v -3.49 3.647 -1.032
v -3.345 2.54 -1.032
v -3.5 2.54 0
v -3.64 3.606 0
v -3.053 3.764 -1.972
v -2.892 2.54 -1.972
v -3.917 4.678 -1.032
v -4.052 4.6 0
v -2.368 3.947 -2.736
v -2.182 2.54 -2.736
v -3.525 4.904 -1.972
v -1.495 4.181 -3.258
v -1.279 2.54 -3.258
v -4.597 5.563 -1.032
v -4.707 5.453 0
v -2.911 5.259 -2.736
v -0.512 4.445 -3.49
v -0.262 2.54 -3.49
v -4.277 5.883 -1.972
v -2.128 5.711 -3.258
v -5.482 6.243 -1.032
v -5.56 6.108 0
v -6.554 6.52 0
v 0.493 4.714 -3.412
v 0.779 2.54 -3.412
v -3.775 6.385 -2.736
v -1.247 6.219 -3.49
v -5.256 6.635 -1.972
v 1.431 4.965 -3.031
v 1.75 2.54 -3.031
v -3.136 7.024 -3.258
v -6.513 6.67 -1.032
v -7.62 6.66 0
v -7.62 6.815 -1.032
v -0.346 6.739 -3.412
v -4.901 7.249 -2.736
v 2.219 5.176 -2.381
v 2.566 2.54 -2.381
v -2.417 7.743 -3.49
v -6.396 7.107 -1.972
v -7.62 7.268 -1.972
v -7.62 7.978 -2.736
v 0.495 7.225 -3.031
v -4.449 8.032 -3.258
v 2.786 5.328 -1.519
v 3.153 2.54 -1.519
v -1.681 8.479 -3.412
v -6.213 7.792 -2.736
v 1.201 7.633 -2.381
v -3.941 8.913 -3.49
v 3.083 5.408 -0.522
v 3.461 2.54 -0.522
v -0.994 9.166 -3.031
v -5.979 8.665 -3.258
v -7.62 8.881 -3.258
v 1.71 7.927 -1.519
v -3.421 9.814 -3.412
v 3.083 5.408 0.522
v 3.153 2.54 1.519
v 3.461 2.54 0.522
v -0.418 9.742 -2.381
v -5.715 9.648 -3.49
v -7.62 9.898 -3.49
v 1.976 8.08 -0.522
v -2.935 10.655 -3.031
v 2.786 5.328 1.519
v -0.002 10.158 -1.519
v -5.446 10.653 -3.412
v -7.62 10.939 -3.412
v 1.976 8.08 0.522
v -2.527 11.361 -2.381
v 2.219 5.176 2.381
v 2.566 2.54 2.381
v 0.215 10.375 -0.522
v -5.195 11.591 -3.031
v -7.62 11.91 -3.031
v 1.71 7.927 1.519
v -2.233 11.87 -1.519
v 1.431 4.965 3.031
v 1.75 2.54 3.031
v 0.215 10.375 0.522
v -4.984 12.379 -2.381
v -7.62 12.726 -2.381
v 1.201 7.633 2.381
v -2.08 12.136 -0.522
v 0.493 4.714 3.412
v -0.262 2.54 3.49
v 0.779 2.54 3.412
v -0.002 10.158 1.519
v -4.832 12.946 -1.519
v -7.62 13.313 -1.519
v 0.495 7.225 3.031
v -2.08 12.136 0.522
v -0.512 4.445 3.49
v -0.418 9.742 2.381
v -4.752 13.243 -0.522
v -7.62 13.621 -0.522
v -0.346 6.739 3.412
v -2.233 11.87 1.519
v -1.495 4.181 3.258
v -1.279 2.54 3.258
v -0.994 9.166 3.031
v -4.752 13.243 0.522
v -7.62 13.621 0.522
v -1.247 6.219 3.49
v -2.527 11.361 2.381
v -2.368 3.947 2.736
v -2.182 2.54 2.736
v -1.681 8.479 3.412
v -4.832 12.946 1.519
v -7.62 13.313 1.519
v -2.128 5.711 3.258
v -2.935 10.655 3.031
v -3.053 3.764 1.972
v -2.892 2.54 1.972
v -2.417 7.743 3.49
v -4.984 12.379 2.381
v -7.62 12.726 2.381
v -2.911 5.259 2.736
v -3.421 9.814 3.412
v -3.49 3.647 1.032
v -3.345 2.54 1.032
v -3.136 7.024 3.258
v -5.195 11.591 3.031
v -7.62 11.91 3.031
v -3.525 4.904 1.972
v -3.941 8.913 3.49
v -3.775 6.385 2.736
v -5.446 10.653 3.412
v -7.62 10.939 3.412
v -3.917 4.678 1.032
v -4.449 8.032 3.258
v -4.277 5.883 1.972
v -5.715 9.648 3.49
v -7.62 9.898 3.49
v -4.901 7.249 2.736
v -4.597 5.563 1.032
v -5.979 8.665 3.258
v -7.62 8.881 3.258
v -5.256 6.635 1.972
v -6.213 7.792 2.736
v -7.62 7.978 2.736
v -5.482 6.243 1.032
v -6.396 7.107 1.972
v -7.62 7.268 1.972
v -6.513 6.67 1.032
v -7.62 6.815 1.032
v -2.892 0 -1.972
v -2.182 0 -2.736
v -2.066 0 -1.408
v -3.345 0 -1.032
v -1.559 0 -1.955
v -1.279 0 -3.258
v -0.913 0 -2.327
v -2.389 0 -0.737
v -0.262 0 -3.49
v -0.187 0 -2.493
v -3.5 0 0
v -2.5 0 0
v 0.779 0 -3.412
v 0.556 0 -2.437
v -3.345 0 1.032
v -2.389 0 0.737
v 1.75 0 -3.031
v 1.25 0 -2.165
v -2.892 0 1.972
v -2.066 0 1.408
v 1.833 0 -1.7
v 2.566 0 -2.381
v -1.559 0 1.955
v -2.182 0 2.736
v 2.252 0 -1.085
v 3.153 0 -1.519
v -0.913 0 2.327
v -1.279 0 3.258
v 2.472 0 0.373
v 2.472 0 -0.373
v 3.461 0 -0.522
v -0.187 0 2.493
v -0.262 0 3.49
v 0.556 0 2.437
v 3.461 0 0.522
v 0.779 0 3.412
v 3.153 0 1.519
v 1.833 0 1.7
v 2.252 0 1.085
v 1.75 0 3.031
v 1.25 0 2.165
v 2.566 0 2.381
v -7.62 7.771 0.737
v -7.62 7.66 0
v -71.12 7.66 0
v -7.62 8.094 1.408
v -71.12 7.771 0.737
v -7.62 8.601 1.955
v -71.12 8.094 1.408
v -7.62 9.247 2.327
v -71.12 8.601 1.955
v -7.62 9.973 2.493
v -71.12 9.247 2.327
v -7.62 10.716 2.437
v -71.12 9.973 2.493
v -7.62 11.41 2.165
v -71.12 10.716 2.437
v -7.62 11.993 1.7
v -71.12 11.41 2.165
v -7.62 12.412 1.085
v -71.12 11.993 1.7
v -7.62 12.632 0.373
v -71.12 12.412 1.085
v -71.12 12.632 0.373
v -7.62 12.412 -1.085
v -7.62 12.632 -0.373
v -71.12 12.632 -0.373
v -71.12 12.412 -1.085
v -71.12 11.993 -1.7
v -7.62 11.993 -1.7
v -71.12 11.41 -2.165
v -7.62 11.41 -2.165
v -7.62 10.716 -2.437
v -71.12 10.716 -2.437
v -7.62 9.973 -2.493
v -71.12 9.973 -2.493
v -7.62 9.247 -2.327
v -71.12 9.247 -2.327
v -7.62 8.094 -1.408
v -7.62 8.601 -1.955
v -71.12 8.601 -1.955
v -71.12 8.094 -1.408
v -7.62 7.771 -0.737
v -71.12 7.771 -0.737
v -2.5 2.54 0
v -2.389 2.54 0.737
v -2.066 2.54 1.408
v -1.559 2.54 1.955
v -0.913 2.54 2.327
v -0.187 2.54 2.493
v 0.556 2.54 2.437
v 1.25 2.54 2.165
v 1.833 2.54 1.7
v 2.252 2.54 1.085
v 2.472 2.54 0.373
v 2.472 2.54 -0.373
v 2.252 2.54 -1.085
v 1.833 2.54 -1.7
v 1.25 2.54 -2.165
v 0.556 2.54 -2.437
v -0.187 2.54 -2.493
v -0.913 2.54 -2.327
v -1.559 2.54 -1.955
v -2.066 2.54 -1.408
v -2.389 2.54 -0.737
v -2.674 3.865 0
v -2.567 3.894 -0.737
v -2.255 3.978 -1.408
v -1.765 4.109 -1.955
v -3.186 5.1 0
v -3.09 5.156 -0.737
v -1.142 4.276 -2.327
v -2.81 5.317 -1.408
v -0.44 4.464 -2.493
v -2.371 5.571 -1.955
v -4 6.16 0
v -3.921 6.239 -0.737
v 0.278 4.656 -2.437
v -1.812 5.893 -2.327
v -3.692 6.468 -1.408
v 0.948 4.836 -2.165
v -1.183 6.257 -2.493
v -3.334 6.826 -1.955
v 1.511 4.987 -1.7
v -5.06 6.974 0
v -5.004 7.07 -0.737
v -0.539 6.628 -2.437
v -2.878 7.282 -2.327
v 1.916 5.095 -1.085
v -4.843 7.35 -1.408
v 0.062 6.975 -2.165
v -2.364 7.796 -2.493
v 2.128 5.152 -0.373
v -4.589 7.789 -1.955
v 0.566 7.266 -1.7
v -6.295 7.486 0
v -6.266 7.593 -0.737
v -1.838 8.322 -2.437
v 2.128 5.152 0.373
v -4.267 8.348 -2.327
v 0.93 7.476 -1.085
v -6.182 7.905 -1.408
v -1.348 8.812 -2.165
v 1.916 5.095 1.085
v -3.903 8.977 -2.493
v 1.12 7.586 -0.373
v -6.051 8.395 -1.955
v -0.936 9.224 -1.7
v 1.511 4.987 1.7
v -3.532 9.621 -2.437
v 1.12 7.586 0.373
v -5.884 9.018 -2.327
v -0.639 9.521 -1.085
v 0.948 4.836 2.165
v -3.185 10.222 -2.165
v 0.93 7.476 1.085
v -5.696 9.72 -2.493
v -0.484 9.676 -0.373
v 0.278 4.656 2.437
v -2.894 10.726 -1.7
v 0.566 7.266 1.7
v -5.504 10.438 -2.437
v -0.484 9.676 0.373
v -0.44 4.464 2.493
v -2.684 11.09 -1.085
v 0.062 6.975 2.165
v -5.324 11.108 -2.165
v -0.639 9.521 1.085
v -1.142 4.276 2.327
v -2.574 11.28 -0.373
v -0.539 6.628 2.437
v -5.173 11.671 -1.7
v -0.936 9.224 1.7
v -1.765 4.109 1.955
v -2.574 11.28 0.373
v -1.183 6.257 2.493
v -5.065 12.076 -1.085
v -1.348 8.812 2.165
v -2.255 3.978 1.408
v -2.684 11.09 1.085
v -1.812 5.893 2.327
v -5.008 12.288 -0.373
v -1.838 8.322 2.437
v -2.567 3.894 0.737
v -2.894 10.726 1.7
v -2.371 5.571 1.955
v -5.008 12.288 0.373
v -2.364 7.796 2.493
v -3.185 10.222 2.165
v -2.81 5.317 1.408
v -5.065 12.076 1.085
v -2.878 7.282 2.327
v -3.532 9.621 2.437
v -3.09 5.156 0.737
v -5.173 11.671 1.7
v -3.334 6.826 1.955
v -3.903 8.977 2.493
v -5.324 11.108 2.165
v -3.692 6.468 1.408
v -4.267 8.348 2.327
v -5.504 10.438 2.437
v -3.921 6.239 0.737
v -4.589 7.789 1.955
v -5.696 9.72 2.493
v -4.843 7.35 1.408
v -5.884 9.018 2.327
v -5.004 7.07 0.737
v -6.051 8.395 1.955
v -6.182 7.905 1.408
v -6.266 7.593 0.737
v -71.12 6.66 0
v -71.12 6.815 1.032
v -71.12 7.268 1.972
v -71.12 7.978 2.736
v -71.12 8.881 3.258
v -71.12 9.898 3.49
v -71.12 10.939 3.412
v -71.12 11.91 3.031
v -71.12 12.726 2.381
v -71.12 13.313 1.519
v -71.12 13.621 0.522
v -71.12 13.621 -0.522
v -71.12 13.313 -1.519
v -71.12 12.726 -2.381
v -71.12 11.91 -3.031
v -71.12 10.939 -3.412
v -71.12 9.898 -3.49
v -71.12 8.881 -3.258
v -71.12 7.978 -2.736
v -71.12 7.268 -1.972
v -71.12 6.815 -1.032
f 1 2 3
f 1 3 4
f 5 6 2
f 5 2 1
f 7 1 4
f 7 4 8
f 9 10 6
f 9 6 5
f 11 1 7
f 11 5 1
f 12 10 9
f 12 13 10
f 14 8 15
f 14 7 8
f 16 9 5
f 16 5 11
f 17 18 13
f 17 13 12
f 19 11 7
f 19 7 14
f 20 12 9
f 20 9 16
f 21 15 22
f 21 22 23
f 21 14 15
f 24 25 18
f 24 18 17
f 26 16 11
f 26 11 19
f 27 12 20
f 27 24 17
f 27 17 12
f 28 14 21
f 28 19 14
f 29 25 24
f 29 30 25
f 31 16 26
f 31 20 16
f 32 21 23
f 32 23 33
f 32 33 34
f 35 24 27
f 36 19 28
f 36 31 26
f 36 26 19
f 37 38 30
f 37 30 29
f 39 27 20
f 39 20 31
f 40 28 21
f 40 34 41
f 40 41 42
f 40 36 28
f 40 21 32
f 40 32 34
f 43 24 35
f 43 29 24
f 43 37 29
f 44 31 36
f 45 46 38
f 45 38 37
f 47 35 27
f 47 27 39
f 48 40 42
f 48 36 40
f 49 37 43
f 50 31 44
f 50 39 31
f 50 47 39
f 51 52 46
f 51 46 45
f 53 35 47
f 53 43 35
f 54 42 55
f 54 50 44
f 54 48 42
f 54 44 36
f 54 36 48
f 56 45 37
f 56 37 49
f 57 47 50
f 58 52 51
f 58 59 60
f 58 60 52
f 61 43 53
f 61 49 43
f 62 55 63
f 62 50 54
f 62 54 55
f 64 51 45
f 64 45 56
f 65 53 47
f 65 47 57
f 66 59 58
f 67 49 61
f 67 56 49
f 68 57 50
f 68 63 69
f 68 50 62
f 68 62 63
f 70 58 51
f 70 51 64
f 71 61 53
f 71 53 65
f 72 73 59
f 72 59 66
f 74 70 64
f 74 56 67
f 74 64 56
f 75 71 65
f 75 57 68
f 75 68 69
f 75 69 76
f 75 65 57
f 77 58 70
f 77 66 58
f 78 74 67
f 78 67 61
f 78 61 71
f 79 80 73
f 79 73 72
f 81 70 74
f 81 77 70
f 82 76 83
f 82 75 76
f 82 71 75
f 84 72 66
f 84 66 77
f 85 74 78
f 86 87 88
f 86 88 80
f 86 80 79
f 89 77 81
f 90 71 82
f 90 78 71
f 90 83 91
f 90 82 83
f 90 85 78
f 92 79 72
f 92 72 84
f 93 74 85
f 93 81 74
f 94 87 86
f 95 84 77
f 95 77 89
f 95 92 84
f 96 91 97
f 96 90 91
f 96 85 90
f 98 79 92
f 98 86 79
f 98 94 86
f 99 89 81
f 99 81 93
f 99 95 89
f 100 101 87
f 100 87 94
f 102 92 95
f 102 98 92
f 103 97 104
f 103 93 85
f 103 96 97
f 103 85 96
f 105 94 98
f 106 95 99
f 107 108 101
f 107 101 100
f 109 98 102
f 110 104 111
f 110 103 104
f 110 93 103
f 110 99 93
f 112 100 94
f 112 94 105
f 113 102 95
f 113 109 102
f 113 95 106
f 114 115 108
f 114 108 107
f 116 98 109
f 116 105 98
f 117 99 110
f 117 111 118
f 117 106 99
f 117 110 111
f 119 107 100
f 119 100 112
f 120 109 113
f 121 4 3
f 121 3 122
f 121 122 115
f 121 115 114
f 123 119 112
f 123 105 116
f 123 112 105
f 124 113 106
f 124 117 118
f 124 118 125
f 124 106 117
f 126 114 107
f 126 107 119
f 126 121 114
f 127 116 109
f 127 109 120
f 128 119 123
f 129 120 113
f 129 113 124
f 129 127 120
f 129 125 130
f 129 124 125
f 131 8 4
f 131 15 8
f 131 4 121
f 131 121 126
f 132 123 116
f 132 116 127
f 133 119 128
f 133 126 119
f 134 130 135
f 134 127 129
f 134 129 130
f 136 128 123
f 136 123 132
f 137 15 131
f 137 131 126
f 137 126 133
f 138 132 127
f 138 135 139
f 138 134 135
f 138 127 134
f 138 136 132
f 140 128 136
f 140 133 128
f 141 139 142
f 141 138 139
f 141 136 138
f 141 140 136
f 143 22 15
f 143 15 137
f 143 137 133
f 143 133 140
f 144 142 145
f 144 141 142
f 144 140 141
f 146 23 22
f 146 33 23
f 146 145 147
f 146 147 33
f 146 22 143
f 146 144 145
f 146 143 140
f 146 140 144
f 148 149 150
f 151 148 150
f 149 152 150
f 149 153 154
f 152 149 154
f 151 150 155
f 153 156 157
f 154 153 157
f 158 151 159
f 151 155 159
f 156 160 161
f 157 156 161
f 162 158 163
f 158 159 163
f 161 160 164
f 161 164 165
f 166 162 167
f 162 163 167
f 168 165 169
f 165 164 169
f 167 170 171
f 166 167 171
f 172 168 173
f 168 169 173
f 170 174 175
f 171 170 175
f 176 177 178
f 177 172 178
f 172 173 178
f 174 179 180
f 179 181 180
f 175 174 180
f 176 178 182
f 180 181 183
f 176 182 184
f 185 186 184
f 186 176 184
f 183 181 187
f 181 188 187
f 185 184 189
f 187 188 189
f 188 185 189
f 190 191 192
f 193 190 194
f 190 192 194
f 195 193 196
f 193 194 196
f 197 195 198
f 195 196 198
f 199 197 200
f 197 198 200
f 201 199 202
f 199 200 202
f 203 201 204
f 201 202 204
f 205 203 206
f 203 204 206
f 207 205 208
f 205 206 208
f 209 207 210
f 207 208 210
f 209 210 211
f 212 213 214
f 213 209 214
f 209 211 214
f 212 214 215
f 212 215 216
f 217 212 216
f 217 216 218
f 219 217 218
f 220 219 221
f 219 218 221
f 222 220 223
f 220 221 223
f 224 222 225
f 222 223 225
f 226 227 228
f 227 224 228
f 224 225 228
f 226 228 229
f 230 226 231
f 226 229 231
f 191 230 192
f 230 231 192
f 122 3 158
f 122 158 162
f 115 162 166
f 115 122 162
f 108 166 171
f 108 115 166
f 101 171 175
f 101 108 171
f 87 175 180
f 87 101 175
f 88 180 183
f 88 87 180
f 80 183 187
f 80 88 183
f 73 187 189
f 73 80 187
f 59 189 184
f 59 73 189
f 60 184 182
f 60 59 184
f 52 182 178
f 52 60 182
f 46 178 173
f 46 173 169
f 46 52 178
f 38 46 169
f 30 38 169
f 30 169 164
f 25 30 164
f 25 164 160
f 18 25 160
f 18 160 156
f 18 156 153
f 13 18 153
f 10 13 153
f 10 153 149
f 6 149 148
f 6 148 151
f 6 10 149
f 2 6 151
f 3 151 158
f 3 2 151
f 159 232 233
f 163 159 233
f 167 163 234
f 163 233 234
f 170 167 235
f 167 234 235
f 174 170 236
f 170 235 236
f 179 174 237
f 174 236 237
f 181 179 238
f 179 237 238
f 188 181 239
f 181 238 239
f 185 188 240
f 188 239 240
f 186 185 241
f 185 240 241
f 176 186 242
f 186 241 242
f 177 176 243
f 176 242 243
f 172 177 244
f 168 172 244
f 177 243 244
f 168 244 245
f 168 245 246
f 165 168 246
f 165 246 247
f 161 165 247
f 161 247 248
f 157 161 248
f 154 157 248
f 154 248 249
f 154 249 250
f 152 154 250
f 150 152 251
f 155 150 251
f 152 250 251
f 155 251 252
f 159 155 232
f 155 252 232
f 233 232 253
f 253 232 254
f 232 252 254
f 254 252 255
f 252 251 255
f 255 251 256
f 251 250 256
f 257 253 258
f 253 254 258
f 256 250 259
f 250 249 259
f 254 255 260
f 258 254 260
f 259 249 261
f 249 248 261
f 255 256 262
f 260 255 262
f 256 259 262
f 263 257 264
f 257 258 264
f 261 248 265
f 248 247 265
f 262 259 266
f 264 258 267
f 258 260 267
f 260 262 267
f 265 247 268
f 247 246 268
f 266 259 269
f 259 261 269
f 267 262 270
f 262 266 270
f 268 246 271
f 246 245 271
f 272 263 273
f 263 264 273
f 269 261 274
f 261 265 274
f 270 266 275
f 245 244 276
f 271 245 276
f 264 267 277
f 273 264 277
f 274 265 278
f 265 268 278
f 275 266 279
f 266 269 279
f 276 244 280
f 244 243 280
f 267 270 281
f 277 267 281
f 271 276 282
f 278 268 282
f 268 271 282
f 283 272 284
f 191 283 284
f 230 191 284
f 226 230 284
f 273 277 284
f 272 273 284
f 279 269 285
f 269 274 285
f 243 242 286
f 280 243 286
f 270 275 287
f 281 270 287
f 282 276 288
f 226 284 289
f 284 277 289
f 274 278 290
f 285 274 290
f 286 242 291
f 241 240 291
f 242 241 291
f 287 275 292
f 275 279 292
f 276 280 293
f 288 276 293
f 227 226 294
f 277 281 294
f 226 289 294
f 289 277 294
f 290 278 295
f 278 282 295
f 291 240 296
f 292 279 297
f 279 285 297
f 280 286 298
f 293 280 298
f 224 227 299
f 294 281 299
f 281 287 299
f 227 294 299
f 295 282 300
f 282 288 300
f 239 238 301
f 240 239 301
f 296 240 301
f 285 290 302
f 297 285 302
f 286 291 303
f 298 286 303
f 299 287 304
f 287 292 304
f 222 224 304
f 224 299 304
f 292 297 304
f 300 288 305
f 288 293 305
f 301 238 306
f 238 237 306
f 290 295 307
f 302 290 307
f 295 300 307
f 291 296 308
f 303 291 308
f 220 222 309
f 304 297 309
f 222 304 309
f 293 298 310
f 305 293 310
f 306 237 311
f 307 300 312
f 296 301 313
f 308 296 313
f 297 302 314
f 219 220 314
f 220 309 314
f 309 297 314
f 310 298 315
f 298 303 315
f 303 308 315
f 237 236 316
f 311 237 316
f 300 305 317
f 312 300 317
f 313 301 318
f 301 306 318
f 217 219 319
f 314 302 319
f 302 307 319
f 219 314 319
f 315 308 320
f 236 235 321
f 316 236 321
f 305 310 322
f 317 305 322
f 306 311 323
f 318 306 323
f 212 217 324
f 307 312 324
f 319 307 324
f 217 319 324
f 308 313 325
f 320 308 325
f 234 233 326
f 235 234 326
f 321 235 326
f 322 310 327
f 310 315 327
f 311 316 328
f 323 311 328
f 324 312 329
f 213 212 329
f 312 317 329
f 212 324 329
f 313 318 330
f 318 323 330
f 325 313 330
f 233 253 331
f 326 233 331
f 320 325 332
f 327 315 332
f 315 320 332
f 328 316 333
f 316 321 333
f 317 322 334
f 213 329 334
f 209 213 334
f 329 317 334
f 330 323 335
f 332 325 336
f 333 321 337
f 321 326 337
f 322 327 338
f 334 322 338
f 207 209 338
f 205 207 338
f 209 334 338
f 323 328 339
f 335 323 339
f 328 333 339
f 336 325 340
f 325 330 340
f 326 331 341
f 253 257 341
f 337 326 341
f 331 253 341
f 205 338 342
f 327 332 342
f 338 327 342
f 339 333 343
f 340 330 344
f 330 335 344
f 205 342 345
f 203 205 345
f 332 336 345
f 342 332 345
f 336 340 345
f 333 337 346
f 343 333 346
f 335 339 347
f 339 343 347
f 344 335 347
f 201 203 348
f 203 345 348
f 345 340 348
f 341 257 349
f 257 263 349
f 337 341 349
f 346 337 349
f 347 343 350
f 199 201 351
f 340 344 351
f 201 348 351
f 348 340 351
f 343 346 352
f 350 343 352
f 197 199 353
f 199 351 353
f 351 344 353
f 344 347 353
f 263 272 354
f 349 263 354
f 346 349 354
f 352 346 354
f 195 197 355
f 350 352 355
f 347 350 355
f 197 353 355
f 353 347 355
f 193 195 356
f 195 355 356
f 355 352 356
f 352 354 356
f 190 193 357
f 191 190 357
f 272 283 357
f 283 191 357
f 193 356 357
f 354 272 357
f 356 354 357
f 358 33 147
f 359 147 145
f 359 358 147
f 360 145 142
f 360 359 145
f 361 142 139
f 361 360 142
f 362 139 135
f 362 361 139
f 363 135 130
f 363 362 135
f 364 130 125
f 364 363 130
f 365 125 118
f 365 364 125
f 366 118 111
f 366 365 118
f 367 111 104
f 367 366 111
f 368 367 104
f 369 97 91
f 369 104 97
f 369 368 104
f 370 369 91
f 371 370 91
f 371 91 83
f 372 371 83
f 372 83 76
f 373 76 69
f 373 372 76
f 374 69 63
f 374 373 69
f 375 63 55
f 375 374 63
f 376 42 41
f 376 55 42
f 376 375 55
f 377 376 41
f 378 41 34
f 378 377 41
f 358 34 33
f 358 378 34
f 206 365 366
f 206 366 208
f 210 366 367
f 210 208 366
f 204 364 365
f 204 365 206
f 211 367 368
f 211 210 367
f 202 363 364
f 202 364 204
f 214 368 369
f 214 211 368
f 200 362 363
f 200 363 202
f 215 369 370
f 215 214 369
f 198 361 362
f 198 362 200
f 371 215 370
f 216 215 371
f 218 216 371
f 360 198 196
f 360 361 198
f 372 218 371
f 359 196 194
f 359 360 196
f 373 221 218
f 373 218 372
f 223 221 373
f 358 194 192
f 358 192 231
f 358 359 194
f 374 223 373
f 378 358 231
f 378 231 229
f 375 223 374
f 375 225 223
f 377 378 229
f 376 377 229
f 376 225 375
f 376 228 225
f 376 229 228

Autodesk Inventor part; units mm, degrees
ref_plane "YZ Plane" through (0, 0, 0) normal (1, 0, 0) x (0, 1, 0)
ref_plane "XZ Plane" through (0, 0, 0) normal (0, 1, 0) x (-1, 0, 0)
ref_plane "XY Plane" through (0, 0, 0) normal (0, 0, 1) x (1, 0, 0)
sketch "Sketch1" plane through (0, 0, 0) normal (0, 1, 0) x (-1, 0, 0)
  circle A0 centre (0, 0) radius 2.5
  circle A1 centre (0, 0) radius 3.5
  dimension "PenetrationUpstreamInnerDiameter" = 5
  dimension "PenetrationUpstreamThickness" = 1
sketch "Sketch2" plane through (0, 0, 0) normal (0, 0, 1) x (1, 0, 0)
  line L0 (-7.62, 10.16) -> (-71.12, 10.16)
  line L1 (0, 0) -> (0, 2.54)
  arc A0 (0, 2.54) -> (-7.62, 10.16) centre (-7.62, 2.54) ccw
  dimension "PenetrationUpstreamLength" = 63.5
  dimension "d14" = 90
  dimension "PenetrationUpstreamDistanceFromWallToCentre" = 10.16
  dimension "StraightBit" = 2.54
sweep "Sweep2" add profiles "Sketch1" path "Sketch2"
equation "\"StraightBit\" = 0.25 * PenetrationUpstreamDistanceFromWallToCentre"
properties part number "PenetrationUpstream"
